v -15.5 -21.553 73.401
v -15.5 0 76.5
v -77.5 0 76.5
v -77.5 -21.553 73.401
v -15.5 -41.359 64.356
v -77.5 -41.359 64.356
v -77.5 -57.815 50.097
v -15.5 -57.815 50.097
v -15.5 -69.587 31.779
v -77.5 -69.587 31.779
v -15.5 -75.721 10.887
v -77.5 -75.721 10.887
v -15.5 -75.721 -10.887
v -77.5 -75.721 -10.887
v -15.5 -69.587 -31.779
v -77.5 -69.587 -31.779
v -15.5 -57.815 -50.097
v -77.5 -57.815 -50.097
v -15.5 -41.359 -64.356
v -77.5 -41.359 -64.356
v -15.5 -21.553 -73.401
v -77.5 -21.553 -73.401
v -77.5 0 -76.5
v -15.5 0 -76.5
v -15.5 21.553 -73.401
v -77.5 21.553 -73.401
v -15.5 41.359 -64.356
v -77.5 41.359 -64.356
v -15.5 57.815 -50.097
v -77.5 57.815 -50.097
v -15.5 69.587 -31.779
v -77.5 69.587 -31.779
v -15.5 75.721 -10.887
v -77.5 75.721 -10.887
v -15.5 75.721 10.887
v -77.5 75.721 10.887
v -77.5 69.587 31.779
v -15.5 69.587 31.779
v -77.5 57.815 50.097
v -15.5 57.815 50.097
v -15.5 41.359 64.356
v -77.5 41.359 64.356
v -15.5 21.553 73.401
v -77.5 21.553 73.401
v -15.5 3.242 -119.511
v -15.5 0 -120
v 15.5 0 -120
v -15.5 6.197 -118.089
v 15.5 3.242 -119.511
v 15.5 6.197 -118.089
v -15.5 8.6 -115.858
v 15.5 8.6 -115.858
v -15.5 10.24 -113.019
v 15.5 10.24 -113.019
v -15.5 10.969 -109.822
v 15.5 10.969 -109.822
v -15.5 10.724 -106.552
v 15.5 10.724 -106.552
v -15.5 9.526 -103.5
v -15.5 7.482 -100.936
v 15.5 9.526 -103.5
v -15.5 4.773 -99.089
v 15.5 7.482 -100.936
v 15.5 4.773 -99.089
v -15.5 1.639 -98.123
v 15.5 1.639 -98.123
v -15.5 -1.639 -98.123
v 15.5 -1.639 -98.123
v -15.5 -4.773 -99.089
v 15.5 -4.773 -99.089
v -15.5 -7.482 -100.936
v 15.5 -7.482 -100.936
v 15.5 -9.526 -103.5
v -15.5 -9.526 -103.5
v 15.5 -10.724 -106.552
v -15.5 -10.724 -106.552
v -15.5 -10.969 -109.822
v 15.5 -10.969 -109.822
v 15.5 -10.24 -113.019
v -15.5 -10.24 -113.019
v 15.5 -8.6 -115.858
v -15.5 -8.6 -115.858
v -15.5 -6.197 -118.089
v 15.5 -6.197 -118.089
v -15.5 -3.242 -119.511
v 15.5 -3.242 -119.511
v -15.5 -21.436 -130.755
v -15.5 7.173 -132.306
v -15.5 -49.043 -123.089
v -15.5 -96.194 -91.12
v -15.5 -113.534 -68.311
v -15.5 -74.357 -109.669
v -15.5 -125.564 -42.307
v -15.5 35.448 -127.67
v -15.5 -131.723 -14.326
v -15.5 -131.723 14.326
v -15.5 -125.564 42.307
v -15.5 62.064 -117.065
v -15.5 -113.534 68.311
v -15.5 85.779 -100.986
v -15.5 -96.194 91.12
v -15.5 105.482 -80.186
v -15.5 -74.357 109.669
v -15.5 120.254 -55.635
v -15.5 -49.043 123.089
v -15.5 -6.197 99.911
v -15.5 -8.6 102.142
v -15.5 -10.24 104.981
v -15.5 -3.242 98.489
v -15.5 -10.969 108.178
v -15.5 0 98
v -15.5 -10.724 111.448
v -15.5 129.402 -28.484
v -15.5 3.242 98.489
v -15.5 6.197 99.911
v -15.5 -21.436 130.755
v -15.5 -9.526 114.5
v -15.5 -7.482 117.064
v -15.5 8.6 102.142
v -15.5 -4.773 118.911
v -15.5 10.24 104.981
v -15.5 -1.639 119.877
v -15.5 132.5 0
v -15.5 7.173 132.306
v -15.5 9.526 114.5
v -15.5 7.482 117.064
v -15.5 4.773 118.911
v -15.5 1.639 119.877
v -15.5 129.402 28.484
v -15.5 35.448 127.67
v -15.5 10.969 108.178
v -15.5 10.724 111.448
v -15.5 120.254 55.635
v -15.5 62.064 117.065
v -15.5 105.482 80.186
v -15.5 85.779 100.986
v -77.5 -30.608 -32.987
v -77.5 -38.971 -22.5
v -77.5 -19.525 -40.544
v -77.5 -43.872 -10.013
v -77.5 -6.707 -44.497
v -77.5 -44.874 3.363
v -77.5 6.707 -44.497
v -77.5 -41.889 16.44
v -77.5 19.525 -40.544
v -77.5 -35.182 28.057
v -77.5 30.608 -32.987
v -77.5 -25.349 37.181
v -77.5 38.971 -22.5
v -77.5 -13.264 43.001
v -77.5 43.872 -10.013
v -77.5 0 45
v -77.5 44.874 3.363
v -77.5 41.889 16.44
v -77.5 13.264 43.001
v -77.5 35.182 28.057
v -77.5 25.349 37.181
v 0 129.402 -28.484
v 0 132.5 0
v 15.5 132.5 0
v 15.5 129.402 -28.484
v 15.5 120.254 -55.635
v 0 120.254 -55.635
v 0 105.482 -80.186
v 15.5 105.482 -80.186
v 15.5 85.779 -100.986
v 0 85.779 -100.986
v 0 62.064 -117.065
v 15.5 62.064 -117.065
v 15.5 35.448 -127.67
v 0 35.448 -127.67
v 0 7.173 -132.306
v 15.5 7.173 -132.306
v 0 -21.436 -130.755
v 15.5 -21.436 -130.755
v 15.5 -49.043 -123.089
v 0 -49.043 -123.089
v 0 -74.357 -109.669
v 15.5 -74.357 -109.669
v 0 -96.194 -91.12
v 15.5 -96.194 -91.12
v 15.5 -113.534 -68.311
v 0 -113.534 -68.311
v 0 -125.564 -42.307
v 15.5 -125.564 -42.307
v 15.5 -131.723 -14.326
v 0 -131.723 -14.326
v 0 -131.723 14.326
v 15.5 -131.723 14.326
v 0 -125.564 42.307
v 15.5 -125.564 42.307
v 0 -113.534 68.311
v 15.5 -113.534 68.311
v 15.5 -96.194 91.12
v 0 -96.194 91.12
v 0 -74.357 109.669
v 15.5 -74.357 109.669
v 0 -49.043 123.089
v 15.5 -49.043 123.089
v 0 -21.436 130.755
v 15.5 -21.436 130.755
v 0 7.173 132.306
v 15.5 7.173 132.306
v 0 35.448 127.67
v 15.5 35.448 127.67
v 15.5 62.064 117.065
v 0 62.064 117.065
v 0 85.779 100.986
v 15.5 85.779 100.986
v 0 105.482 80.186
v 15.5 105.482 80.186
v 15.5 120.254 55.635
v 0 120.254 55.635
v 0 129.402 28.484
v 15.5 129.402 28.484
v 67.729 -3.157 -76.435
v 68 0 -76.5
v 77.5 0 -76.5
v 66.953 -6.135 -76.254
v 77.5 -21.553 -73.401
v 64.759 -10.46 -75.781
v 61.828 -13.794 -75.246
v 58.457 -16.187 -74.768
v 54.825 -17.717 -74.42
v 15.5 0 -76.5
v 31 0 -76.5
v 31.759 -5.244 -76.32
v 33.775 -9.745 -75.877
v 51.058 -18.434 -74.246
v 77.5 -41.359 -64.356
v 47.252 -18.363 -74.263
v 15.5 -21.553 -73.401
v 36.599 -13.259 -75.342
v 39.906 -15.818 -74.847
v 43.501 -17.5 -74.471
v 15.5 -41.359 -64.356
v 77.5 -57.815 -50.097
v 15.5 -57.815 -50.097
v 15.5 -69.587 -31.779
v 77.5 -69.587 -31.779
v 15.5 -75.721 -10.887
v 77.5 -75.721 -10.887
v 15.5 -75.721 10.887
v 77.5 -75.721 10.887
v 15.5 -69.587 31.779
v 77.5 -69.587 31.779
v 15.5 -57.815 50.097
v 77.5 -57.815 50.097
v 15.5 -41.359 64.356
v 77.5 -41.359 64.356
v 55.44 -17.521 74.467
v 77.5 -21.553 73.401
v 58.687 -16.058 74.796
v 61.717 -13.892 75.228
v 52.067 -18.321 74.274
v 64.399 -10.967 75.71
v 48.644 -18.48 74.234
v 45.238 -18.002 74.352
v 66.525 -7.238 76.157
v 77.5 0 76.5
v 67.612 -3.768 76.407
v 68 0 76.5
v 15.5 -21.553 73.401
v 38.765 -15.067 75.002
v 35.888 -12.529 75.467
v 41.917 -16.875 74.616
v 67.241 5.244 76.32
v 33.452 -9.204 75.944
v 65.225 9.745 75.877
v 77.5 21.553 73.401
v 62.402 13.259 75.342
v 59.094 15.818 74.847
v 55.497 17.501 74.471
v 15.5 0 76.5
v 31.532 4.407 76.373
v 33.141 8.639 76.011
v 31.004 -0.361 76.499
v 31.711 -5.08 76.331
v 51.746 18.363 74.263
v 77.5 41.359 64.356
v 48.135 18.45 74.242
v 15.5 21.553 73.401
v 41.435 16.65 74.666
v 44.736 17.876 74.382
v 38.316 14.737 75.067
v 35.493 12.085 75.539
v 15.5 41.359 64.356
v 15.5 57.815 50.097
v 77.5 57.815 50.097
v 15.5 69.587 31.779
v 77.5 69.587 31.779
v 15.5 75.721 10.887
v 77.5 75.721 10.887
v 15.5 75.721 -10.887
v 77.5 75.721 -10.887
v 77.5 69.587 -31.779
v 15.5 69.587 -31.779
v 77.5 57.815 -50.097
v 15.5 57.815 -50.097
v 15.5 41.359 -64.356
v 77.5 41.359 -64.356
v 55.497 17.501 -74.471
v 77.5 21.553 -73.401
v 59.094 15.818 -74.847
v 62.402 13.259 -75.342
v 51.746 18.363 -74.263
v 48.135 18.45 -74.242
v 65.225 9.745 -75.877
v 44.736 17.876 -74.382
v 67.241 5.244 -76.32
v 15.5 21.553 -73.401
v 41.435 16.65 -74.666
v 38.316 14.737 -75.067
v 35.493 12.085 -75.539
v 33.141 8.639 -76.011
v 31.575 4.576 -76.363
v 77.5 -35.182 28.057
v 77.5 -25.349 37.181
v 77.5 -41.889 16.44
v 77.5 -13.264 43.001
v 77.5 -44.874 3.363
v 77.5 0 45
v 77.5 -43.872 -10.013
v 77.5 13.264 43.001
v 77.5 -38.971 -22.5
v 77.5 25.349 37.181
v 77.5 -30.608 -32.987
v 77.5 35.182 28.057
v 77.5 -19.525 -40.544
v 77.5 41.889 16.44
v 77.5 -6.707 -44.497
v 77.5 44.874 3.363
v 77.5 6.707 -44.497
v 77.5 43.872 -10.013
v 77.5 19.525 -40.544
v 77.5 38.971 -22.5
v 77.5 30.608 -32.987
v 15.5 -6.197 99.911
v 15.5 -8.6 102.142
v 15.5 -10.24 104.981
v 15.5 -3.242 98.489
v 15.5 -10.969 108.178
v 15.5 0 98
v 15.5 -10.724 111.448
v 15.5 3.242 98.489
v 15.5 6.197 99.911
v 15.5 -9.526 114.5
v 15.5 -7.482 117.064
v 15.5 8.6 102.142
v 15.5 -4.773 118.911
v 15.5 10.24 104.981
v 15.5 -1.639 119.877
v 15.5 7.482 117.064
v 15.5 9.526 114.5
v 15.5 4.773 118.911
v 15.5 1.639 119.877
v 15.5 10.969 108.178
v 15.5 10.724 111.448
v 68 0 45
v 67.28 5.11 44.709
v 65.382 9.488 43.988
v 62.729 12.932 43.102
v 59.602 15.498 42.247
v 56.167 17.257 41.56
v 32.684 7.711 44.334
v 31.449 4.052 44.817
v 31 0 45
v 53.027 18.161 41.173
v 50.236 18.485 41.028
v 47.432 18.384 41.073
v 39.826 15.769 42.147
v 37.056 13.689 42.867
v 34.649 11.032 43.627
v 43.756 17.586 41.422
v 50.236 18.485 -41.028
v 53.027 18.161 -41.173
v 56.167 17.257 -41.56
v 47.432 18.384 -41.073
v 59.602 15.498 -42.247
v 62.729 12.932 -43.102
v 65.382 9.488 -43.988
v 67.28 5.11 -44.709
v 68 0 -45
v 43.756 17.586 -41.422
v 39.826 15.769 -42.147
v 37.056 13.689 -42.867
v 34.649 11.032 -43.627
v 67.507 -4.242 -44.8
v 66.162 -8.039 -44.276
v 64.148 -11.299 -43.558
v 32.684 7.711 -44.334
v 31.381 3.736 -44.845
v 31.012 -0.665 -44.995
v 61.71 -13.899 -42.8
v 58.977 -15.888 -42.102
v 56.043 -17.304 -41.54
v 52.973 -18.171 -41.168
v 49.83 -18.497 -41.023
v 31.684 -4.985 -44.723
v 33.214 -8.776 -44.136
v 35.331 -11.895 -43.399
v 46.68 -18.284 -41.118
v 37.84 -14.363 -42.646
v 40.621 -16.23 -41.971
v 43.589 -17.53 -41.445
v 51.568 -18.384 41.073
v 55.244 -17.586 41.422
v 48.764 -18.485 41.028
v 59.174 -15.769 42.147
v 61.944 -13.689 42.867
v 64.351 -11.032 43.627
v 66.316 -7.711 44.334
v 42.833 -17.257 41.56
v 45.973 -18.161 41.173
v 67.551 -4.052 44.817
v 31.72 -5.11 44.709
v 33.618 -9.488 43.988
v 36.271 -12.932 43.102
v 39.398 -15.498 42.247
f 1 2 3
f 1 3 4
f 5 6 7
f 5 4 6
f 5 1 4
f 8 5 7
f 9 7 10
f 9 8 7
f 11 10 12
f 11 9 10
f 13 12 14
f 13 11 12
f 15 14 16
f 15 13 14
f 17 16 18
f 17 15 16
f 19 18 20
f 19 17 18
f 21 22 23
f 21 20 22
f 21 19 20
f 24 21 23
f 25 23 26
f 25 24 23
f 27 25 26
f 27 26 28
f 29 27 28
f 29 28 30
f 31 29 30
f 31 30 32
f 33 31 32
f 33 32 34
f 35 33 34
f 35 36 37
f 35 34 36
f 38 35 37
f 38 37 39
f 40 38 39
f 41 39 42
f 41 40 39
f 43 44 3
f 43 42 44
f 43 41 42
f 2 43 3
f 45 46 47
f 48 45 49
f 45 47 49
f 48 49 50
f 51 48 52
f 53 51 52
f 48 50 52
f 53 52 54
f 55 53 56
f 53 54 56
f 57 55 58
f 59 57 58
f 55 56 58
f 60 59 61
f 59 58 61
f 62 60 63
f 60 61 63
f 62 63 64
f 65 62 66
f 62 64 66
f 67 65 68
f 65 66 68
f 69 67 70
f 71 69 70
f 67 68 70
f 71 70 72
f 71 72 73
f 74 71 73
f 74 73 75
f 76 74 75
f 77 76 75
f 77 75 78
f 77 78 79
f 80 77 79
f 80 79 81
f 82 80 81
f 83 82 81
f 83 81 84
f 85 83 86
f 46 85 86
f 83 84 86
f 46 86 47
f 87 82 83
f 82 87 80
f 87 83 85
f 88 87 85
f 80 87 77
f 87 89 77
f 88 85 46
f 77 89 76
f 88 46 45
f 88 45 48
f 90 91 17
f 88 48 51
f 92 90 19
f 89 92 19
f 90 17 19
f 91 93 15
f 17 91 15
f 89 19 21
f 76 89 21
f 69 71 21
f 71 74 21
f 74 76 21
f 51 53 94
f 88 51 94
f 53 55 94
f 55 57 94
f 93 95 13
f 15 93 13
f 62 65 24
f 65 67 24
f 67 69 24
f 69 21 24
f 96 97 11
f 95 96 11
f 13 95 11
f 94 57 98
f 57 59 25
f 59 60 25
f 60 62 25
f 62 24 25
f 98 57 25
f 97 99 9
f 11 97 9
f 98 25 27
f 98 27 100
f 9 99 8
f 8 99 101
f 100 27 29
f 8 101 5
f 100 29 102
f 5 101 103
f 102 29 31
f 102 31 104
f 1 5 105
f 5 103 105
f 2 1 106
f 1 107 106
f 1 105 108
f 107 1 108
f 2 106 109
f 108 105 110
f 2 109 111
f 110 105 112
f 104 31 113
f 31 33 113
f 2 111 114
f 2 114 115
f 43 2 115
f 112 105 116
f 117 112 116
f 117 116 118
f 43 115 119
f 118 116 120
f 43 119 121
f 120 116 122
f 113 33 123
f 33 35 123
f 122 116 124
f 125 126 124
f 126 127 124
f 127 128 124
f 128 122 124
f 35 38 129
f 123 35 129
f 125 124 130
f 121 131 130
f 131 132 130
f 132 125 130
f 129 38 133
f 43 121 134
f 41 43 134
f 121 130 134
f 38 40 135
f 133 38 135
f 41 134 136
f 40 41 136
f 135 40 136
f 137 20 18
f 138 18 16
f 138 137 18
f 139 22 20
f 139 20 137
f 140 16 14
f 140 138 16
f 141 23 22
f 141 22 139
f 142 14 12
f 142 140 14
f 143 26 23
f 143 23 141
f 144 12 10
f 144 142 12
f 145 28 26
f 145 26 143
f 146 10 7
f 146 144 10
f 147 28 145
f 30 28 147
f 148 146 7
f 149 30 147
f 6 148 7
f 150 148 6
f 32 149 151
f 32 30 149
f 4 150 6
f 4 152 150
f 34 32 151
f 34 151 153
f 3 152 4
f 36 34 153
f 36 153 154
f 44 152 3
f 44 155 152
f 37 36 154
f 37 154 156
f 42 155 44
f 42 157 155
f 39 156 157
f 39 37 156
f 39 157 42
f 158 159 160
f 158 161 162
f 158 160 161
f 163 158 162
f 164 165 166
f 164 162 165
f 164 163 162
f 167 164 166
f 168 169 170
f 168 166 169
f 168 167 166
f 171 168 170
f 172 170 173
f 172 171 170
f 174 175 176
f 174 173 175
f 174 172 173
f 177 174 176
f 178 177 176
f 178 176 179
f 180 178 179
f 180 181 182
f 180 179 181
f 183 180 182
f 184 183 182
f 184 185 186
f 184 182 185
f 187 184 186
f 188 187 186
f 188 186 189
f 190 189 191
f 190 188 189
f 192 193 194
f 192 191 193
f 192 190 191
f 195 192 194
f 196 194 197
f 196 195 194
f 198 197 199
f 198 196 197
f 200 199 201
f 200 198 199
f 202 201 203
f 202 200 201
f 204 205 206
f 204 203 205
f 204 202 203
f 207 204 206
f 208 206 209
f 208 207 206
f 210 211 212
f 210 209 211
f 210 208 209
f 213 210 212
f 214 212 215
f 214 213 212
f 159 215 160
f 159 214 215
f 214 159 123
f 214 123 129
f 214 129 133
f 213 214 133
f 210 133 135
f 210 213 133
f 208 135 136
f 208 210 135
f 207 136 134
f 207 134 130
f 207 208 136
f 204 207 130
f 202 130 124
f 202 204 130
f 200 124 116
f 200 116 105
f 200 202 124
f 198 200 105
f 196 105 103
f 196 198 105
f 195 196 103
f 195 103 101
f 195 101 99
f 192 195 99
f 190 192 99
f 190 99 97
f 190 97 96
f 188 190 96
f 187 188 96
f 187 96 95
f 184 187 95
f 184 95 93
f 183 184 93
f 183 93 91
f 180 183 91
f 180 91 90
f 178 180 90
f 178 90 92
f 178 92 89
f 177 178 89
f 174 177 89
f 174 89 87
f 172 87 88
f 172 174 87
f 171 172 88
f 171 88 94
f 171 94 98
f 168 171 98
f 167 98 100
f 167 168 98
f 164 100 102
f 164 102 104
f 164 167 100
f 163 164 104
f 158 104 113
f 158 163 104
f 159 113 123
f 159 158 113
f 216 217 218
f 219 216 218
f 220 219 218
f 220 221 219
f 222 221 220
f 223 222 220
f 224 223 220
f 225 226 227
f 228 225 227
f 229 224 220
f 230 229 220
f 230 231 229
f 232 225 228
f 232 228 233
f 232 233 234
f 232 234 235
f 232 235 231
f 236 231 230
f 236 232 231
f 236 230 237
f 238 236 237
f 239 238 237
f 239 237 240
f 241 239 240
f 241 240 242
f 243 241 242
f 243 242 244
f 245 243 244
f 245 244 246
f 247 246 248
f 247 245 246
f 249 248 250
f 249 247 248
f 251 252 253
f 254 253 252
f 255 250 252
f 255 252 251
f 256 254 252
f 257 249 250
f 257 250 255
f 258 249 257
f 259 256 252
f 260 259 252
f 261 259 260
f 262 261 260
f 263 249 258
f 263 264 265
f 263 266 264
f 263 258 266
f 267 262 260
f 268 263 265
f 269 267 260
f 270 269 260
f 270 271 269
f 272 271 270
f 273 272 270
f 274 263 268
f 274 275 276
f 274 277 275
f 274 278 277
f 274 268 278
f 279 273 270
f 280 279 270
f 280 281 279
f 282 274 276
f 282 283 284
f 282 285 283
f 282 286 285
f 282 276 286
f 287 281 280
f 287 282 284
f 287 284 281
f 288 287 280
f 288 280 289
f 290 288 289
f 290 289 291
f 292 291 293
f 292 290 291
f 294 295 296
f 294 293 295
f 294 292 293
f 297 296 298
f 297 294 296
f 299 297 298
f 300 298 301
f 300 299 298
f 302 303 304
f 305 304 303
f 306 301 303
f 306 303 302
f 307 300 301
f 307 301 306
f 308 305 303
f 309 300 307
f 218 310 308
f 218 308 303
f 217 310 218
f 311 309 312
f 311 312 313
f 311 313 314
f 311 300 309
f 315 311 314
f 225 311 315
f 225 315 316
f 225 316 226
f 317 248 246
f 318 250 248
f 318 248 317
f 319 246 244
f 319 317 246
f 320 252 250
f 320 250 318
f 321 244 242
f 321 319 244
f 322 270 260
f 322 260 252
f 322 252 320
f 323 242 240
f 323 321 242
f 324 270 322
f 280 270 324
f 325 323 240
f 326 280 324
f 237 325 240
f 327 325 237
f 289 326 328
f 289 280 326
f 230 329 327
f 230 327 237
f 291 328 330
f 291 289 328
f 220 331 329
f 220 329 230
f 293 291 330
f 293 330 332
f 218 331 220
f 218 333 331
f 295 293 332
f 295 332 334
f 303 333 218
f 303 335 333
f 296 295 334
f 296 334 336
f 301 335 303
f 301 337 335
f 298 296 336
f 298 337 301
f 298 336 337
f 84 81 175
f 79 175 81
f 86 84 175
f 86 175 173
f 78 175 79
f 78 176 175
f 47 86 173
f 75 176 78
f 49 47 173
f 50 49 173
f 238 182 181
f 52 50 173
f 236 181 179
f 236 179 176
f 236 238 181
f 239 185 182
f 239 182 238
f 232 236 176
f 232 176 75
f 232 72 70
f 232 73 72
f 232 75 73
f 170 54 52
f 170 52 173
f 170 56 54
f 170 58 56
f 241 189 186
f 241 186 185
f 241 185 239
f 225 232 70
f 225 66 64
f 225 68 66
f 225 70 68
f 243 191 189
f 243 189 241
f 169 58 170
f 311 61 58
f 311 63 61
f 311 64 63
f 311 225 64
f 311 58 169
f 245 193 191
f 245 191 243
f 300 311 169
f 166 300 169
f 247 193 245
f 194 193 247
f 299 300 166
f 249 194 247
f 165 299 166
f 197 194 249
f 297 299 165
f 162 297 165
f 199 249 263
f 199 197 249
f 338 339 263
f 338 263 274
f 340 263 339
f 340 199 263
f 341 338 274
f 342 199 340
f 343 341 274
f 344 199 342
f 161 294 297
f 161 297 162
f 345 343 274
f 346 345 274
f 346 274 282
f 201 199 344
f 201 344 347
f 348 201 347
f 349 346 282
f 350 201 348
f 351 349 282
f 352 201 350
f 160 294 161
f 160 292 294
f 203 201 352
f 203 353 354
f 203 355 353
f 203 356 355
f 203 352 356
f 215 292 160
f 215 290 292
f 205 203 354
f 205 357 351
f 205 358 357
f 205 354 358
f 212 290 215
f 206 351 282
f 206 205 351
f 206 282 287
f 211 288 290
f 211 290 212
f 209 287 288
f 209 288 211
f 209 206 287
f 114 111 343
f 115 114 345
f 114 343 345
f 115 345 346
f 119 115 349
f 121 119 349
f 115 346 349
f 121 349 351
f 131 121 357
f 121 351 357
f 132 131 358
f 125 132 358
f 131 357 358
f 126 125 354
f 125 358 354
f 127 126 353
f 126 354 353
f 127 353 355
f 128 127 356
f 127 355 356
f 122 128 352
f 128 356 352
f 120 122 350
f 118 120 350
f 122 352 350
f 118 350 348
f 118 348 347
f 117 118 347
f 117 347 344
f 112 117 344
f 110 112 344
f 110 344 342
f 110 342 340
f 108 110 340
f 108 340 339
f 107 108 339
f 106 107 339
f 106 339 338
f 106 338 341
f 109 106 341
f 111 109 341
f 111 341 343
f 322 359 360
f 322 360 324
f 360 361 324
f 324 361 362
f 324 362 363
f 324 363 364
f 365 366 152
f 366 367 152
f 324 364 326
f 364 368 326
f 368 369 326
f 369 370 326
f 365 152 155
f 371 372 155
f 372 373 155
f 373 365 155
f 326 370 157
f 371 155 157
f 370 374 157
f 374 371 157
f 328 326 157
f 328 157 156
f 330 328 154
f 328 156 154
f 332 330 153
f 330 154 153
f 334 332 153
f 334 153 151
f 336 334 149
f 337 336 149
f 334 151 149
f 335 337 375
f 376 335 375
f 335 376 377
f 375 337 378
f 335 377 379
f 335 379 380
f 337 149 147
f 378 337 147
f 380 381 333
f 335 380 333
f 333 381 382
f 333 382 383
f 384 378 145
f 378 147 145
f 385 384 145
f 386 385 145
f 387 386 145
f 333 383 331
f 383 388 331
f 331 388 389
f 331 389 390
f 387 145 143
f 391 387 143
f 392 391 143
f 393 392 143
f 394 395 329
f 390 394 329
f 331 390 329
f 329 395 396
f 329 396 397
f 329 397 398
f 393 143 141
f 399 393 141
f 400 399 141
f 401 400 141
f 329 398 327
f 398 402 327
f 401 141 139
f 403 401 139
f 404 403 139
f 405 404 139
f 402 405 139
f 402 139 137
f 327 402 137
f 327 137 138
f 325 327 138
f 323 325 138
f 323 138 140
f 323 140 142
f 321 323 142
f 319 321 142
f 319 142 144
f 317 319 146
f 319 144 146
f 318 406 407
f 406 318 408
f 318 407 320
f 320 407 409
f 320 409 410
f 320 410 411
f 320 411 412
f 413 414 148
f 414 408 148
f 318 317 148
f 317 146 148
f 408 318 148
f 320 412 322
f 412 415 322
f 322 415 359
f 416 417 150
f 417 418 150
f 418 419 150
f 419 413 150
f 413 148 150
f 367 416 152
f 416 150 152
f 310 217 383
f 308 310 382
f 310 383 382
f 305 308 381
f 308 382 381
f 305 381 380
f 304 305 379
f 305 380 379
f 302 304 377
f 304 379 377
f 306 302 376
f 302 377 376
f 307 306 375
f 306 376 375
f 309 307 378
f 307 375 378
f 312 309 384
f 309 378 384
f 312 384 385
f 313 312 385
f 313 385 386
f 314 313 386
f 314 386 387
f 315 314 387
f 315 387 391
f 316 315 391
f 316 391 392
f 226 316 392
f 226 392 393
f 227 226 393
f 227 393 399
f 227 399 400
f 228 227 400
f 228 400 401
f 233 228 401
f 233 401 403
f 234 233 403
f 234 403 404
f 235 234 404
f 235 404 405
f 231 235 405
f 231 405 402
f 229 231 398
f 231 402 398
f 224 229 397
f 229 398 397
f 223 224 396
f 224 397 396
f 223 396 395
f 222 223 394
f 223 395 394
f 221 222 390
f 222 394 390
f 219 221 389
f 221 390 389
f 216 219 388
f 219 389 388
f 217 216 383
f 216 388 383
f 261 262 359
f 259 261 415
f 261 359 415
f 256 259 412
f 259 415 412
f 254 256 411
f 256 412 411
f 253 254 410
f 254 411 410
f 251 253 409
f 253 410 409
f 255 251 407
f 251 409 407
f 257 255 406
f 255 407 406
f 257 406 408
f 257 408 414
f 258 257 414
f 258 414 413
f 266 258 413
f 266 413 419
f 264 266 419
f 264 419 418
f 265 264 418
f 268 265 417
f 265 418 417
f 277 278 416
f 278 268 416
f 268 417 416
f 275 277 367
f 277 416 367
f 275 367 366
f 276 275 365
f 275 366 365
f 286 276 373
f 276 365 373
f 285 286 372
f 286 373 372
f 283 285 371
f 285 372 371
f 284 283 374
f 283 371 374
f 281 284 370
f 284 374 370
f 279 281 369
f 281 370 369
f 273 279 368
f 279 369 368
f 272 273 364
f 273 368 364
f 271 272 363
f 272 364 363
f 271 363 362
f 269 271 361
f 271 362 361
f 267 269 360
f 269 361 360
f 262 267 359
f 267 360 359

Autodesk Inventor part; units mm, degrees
ref_plane "YZ Plane" through (0, 0, 0) normal (1, 0, 0) x (0, 1, 0)
ref_plane "XZ Plane" through (0, 0, 0) normal (0, 1, 0) x (-1, 0, 0)
ref_plane "XY Plane" through (0, 0, 0) normal (0, 0, 1) x (1, 0, 0)
sketch "Эскиз1" plane through (0, 0, 0) normal (1, 0, 0) x (0, 1, 0)
  circle A0 centre (0, 0) radius 132.5
  dimension "d0" = 265
extrude "Выдавливание1" add sketch "Эскиз1" along normal mid plane 31
sketch "Эскиз2" plane through (15.5, 0, 0) normal (1, 0, 0) x (0, 0, -1)
  circle A0 centre (0, 0) radius 76.5
  dimension "d3" = 153
extrude "Выдавливание2" add sketch "Эскиз2" along normal blind 62
sketch "Эскиз3" plane through (-15.5, 0, 0) normal (-1, 0, 0) x (0, 0, 1)
  circle A0 centre (0, 0) radius 76.5
  dimension "d6" = 153
extrude "Выдавливание3" add sketch "Эскиз3" along normal blind 62
sketch "Эскиз4" plane through (-77.5, 0, 0) normal (-1, 0, 0) x (0, 0, 1)
  circle A0 centre (0, 0) radius 45
  dimension "d9" = 90
extrude "Выдавливание4" cut sketch "Эскиз4" against normal through all
sketch "Эскиз5" plane through (0, 0, 0) normal (0, 0, 1) x (1, 0, 0)
  circle A0 centre (49.5, 0) radius 18.5
  line L0 (77.5, 45) -> (77.5, -45) projected
  point P0 (0, 0)
  dimension "d12" = 28
  dimension "d13" = 37
extrude "Выдавливание5" cut sketch "Эскиз5" along normal through all both and the other way through all
sketch "Эскиз7" plane through (15.5, 0, 0) normal (1, 0, 0) x (0, 0, -1)
  circle A0 centre (-109, 0) radius 11
  circle A1 centre (109, 0) radius 11
  point P0 (0, 0)
  dimension "d16" = 109
  dimension "d17" = 109
  dimension "d18" = 22
  dimension "d19" = 22
extrude "Выдавливание6" cut sketch "Эскиз7" against normal through all
sketch "Эскиз8" plane through (0, 0, 0) normal (0, 1, 0) x (-1, 0, 0)
  point P0 (0, 0)
properties part number "Переходник Чугун СЧ15"
